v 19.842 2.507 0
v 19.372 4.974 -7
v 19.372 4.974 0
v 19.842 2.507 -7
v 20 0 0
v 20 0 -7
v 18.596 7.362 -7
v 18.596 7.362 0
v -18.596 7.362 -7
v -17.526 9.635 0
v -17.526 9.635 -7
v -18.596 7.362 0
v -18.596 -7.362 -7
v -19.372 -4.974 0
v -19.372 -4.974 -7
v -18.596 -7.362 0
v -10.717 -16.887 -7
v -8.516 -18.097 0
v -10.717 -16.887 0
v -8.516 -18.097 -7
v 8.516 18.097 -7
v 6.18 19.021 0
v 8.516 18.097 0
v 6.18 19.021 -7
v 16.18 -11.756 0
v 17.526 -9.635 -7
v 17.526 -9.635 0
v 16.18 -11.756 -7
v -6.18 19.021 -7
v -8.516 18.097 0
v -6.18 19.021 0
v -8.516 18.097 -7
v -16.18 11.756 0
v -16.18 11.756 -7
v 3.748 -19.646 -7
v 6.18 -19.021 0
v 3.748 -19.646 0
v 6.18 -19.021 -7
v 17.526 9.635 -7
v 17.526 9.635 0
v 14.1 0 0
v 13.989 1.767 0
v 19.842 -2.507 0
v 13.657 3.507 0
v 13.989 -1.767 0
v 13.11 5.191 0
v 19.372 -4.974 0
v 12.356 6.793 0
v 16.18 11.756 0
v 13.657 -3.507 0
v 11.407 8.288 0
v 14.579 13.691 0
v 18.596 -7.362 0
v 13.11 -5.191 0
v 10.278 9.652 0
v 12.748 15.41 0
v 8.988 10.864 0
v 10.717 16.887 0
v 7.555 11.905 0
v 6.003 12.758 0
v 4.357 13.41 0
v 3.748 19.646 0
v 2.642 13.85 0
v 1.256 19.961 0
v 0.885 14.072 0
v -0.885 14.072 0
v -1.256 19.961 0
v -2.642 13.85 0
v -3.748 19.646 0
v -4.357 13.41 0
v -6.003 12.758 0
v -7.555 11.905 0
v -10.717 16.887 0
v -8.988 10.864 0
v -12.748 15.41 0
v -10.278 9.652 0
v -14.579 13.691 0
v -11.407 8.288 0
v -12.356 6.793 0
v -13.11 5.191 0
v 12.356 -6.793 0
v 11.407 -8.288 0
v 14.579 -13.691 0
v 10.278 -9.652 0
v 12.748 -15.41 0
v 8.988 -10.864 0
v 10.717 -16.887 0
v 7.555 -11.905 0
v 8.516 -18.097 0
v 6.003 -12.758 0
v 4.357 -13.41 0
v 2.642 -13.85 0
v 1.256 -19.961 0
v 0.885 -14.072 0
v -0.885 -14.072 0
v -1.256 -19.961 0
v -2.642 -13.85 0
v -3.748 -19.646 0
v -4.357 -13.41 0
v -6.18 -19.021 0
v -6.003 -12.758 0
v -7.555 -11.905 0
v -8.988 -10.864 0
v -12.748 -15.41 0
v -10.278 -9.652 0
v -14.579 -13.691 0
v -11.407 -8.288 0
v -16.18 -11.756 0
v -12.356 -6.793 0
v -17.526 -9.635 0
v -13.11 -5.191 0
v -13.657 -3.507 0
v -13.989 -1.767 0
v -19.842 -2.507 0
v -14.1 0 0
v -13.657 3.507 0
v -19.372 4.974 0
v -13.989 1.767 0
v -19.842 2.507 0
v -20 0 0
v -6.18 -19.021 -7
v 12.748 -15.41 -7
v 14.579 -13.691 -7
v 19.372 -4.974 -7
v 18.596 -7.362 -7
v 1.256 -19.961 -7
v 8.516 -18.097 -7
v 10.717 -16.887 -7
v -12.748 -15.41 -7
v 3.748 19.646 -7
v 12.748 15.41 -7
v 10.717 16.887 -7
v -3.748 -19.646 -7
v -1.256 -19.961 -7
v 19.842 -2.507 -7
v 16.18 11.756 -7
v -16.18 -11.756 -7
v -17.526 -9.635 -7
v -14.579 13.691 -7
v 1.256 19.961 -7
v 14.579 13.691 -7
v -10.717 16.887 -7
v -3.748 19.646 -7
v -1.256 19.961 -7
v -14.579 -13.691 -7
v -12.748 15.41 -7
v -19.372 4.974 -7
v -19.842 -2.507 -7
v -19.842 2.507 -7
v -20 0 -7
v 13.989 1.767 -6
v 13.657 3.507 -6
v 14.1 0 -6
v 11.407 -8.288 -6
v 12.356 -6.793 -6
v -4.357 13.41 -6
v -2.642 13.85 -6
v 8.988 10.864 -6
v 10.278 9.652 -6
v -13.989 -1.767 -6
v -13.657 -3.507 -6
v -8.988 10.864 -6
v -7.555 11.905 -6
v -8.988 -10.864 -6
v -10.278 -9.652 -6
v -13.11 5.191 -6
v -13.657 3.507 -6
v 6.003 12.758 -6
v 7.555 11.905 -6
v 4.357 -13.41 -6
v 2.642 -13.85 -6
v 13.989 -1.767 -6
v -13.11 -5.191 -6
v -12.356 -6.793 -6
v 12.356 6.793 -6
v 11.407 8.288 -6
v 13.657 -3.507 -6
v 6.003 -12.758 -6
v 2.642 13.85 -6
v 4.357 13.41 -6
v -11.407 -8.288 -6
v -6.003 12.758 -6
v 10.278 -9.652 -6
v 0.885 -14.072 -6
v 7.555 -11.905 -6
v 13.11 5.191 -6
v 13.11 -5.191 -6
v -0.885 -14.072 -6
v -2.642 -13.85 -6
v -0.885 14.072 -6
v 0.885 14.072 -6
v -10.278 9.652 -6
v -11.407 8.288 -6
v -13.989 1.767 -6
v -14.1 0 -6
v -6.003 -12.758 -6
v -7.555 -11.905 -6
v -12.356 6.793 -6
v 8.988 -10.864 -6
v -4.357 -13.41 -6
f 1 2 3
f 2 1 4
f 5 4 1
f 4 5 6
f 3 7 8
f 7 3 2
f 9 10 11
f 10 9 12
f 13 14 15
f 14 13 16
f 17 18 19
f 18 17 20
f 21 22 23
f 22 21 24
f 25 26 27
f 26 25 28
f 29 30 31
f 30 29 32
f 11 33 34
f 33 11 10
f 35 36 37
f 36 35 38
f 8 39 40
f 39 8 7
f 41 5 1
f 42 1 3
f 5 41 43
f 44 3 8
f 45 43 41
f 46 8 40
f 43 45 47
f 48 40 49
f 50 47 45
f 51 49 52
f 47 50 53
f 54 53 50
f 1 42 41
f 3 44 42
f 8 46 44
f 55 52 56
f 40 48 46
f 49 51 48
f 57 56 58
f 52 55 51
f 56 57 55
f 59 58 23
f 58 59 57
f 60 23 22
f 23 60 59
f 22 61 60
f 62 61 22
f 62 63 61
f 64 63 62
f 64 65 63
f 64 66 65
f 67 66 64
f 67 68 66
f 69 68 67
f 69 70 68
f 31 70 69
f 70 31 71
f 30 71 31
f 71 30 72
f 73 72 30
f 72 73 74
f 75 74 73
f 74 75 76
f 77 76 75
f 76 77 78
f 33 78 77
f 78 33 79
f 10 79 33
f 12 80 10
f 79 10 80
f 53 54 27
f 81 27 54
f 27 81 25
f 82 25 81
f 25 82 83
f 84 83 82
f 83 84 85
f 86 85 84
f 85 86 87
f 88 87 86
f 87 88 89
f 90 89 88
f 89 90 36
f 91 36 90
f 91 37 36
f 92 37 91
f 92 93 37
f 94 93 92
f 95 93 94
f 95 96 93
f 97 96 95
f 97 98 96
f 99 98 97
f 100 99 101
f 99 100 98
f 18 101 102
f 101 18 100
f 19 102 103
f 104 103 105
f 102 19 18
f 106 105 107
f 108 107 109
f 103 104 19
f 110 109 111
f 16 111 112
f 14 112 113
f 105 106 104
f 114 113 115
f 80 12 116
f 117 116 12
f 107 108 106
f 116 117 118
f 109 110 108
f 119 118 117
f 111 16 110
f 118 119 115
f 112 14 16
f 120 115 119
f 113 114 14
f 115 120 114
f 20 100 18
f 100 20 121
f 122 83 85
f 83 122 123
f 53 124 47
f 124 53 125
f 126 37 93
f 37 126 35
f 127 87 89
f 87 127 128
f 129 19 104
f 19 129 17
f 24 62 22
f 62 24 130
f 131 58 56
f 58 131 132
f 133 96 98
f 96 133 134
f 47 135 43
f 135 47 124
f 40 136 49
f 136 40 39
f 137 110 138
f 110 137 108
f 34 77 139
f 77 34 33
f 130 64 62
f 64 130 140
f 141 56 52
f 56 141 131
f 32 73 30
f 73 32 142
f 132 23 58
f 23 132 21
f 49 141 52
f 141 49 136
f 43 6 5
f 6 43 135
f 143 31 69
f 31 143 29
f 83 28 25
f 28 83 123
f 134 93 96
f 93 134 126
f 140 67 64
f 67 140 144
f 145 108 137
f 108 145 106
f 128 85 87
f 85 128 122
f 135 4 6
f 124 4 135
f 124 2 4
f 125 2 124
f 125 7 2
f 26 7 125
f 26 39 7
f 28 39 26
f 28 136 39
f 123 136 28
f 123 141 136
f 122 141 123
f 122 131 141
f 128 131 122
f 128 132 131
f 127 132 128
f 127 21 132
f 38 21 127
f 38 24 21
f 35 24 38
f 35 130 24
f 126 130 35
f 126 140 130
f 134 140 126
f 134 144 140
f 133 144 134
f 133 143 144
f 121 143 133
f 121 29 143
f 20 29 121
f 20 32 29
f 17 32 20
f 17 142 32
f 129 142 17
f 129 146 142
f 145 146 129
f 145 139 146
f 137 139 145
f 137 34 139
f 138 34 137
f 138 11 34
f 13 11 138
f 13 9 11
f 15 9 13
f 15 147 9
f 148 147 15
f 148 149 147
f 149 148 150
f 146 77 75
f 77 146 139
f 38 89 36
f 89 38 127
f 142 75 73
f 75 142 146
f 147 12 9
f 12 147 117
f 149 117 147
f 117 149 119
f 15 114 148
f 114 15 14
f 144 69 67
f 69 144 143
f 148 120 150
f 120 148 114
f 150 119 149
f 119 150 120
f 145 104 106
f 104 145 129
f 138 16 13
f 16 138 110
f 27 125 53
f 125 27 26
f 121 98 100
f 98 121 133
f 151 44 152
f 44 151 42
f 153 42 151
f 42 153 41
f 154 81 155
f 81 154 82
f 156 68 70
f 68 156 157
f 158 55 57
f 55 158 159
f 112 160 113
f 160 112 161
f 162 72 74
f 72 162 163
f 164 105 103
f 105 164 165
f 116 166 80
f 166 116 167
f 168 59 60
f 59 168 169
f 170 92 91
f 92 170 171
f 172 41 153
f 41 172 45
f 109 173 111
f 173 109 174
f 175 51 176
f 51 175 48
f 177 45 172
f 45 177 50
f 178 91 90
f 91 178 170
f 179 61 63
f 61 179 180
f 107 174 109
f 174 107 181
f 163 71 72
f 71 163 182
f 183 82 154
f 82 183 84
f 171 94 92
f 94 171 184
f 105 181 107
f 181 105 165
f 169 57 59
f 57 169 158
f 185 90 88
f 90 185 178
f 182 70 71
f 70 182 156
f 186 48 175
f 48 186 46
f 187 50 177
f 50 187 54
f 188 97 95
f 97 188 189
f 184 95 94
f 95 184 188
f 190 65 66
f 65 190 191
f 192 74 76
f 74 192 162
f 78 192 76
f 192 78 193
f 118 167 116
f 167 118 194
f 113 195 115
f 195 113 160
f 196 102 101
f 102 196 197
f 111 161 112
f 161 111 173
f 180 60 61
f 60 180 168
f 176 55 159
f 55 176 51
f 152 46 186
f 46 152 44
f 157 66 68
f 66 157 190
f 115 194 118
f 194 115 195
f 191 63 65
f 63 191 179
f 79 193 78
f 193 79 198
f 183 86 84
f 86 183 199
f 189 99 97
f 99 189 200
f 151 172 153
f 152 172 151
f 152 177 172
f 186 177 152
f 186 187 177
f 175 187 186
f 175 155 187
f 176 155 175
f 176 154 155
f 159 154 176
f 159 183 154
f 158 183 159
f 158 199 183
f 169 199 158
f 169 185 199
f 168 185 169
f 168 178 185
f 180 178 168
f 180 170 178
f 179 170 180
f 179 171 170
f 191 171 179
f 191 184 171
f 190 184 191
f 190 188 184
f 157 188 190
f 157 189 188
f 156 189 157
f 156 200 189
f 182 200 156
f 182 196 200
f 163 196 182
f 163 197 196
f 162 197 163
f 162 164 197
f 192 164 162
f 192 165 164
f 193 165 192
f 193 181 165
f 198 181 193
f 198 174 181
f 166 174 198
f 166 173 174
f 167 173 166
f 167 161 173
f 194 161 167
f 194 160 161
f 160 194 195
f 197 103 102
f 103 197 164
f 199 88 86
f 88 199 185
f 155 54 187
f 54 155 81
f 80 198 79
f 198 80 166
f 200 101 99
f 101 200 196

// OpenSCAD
$fn = 50;


difference() {
	union() {
		translate(v = [0, 0, -7.0000000000]) {
			cylinder(h = 7, r = 20.0000000000);
		}
	}
	union() {
		#translate(v = [0, 0, -6.0000000000]) {
			cylinder(h = 6, r = 14.1000000000);
		}
	}
}
